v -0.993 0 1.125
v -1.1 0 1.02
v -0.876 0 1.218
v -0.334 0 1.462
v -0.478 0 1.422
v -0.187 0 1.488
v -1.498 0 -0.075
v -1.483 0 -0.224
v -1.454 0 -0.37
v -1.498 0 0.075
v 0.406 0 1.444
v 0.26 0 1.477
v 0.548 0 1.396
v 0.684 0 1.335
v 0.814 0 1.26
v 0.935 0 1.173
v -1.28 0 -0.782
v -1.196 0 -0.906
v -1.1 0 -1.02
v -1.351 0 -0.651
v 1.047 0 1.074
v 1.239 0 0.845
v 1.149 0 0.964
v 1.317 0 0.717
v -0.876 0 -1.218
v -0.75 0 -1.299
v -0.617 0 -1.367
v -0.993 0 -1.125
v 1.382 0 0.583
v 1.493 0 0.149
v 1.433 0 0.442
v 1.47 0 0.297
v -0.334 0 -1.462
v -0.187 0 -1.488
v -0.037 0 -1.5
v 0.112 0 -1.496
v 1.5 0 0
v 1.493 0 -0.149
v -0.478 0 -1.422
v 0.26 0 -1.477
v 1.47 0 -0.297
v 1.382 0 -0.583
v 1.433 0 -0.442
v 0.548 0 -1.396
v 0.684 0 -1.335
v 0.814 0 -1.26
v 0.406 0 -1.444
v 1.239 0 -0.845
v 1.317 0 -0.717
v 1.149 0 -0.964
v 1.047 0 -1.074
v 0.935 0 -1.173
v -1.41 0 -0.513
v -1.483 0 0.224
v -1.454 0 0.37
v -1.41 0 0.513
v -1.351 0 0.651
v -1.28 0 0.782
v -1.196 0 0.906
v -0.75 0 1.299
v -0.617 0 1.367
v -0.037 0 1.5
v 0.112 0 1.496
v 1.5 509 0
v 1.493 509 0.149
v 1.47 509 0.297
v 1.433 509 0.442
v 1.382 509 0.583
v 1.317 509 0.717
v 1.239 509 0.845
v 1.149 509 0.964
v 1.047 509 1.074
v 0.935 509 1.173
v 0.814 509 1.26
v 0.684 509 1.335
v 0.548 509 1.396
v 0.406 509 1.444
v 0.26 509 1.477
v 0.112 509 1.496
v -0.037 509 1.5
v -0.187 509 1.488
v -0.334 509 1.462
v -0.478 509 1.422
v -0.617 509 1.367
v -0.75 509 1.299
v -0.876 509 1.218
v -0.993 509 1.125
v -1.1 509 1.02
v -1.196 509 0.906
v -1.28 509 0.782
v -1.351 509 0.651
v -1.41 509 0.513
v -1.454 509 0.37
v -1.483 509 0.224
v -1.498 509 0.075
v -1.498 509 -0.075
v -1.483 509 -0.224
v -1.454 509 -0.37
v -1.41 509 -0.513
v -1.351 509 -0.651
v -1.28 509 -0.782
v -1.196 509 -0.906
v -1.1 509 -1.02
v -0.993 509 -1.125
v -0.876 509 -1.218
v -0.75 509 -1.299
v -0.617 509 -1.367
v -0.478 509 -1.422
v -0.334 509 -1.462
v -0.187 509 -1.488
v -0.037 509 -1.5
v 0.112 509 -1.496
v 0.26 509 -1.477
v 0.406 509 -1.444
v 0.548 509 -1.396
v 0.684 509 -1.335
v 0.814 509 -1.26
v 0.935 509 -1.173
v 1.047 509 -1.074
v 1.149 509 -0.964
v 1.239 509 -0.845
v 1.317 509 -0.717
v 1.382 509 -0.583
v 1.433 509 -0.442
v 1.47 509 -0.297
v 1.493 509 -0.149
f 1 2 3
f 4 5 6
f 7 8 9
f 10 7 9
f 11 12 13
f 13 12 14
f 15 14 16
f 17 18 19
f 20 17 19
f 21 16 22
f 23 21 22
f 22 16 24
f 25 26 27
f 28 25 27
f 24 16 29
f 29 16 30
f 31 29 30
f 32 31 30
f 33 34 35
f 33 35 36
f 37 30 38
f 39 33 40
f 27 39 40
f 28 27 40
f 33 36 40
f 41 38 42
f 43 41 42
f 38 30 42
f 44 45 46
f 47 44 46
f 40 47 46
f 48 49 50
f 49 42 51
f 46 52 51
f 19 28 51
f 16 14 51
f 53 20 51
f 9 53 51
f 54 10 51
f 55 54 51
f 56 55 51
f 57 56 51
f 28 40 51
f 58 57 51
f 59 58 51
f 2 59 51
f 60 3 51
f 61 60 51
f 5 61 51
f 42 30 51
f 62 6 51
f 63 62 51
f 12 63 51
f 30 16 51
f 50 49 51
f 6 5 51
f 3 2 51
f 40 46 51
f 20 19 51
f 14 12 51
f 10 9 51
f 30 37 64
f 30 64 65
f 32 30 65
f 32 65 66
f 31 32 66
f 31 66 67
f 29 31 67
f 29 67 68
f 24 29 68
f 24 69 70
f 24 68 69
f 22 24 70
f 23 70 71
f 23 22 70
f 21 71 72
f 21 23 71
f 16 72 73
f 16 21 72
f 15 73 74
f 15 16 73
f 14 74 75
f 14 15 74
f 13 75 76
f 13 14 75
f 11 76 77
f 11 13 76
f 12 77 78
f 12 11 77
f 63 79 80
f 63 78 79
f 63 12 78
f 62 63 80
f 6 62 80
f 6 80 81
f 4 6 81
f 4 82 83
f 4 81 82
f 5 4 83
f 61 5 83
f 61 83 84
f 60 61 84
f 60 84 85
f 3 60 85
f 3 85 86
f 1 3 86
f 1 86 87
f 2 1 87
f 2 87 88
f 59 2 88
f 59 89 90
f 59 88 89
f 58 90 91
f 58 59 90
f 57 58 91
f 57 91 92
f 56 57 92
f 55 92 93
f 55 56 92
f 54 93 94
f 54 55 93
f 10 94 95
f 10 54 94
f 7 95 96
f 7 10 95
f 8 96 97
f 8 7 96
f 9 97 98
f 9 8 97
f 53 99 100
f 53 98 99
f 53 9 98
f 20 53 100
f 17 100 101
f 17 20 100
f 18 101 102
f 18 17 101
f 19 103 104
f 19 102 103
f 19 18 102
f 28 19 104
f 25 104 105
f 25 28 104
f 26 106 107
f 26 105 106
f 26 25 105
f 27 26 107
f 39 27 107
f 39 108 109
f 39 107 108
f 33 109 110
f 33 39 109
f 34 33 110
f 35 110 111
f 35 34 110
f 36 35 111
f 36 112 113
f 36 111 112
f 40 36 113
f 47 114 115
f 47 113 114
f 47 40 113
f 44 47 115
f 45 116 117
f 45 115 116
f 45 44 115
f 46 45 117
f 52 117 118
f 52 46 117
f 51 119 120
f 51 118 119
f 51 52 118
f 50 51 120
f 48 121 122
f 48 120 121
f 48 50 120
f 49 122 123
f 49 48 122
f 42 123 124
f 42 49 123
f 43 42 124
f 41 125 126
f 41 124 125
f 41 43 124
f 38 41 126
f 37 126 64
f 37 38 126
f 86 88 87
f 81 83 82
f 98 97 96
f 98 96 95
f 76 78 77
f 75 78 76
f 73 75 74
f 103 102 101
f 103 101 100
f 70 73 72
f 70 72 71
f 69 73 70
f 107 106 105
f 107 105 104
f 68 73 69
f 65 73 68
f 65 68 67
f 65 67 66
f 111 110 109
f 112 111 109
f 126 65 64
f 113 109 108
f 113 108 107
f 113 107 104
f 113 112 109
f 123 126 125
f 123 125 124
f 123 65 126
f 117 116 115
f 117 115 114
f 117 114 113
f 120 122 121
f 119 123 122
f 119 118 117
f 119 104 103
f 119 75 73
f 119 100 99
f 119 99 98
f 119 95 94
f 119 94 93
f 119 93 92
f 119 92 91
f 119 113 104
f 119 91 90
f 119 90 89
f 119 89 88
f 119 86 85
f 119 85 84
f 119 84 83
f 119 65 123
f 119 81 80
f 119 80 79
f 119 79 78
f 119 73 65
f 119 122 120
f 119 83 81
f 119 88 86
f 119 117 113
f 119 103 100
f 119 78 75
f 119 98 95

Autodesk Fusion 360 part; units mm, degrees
sketch "Sketch1" plane through (0, 0, 0) normal (0, 1, 0) x (1, 0, 0)
  circle A0 centre (0, 0) radius 1.5
  dimension "d1" = 3
extrude "Extrude1" add sketch "Sketch1" along normal blind 500
extrude "Extrude2" add 1 faces at (0.567, 500, 0.5383) along direction (0, 1, 0) blind 5
extrude "Extrude3" add 1 faces at (0.567, 505, 0.5383) along direction (0, 1, 0) blind 4
